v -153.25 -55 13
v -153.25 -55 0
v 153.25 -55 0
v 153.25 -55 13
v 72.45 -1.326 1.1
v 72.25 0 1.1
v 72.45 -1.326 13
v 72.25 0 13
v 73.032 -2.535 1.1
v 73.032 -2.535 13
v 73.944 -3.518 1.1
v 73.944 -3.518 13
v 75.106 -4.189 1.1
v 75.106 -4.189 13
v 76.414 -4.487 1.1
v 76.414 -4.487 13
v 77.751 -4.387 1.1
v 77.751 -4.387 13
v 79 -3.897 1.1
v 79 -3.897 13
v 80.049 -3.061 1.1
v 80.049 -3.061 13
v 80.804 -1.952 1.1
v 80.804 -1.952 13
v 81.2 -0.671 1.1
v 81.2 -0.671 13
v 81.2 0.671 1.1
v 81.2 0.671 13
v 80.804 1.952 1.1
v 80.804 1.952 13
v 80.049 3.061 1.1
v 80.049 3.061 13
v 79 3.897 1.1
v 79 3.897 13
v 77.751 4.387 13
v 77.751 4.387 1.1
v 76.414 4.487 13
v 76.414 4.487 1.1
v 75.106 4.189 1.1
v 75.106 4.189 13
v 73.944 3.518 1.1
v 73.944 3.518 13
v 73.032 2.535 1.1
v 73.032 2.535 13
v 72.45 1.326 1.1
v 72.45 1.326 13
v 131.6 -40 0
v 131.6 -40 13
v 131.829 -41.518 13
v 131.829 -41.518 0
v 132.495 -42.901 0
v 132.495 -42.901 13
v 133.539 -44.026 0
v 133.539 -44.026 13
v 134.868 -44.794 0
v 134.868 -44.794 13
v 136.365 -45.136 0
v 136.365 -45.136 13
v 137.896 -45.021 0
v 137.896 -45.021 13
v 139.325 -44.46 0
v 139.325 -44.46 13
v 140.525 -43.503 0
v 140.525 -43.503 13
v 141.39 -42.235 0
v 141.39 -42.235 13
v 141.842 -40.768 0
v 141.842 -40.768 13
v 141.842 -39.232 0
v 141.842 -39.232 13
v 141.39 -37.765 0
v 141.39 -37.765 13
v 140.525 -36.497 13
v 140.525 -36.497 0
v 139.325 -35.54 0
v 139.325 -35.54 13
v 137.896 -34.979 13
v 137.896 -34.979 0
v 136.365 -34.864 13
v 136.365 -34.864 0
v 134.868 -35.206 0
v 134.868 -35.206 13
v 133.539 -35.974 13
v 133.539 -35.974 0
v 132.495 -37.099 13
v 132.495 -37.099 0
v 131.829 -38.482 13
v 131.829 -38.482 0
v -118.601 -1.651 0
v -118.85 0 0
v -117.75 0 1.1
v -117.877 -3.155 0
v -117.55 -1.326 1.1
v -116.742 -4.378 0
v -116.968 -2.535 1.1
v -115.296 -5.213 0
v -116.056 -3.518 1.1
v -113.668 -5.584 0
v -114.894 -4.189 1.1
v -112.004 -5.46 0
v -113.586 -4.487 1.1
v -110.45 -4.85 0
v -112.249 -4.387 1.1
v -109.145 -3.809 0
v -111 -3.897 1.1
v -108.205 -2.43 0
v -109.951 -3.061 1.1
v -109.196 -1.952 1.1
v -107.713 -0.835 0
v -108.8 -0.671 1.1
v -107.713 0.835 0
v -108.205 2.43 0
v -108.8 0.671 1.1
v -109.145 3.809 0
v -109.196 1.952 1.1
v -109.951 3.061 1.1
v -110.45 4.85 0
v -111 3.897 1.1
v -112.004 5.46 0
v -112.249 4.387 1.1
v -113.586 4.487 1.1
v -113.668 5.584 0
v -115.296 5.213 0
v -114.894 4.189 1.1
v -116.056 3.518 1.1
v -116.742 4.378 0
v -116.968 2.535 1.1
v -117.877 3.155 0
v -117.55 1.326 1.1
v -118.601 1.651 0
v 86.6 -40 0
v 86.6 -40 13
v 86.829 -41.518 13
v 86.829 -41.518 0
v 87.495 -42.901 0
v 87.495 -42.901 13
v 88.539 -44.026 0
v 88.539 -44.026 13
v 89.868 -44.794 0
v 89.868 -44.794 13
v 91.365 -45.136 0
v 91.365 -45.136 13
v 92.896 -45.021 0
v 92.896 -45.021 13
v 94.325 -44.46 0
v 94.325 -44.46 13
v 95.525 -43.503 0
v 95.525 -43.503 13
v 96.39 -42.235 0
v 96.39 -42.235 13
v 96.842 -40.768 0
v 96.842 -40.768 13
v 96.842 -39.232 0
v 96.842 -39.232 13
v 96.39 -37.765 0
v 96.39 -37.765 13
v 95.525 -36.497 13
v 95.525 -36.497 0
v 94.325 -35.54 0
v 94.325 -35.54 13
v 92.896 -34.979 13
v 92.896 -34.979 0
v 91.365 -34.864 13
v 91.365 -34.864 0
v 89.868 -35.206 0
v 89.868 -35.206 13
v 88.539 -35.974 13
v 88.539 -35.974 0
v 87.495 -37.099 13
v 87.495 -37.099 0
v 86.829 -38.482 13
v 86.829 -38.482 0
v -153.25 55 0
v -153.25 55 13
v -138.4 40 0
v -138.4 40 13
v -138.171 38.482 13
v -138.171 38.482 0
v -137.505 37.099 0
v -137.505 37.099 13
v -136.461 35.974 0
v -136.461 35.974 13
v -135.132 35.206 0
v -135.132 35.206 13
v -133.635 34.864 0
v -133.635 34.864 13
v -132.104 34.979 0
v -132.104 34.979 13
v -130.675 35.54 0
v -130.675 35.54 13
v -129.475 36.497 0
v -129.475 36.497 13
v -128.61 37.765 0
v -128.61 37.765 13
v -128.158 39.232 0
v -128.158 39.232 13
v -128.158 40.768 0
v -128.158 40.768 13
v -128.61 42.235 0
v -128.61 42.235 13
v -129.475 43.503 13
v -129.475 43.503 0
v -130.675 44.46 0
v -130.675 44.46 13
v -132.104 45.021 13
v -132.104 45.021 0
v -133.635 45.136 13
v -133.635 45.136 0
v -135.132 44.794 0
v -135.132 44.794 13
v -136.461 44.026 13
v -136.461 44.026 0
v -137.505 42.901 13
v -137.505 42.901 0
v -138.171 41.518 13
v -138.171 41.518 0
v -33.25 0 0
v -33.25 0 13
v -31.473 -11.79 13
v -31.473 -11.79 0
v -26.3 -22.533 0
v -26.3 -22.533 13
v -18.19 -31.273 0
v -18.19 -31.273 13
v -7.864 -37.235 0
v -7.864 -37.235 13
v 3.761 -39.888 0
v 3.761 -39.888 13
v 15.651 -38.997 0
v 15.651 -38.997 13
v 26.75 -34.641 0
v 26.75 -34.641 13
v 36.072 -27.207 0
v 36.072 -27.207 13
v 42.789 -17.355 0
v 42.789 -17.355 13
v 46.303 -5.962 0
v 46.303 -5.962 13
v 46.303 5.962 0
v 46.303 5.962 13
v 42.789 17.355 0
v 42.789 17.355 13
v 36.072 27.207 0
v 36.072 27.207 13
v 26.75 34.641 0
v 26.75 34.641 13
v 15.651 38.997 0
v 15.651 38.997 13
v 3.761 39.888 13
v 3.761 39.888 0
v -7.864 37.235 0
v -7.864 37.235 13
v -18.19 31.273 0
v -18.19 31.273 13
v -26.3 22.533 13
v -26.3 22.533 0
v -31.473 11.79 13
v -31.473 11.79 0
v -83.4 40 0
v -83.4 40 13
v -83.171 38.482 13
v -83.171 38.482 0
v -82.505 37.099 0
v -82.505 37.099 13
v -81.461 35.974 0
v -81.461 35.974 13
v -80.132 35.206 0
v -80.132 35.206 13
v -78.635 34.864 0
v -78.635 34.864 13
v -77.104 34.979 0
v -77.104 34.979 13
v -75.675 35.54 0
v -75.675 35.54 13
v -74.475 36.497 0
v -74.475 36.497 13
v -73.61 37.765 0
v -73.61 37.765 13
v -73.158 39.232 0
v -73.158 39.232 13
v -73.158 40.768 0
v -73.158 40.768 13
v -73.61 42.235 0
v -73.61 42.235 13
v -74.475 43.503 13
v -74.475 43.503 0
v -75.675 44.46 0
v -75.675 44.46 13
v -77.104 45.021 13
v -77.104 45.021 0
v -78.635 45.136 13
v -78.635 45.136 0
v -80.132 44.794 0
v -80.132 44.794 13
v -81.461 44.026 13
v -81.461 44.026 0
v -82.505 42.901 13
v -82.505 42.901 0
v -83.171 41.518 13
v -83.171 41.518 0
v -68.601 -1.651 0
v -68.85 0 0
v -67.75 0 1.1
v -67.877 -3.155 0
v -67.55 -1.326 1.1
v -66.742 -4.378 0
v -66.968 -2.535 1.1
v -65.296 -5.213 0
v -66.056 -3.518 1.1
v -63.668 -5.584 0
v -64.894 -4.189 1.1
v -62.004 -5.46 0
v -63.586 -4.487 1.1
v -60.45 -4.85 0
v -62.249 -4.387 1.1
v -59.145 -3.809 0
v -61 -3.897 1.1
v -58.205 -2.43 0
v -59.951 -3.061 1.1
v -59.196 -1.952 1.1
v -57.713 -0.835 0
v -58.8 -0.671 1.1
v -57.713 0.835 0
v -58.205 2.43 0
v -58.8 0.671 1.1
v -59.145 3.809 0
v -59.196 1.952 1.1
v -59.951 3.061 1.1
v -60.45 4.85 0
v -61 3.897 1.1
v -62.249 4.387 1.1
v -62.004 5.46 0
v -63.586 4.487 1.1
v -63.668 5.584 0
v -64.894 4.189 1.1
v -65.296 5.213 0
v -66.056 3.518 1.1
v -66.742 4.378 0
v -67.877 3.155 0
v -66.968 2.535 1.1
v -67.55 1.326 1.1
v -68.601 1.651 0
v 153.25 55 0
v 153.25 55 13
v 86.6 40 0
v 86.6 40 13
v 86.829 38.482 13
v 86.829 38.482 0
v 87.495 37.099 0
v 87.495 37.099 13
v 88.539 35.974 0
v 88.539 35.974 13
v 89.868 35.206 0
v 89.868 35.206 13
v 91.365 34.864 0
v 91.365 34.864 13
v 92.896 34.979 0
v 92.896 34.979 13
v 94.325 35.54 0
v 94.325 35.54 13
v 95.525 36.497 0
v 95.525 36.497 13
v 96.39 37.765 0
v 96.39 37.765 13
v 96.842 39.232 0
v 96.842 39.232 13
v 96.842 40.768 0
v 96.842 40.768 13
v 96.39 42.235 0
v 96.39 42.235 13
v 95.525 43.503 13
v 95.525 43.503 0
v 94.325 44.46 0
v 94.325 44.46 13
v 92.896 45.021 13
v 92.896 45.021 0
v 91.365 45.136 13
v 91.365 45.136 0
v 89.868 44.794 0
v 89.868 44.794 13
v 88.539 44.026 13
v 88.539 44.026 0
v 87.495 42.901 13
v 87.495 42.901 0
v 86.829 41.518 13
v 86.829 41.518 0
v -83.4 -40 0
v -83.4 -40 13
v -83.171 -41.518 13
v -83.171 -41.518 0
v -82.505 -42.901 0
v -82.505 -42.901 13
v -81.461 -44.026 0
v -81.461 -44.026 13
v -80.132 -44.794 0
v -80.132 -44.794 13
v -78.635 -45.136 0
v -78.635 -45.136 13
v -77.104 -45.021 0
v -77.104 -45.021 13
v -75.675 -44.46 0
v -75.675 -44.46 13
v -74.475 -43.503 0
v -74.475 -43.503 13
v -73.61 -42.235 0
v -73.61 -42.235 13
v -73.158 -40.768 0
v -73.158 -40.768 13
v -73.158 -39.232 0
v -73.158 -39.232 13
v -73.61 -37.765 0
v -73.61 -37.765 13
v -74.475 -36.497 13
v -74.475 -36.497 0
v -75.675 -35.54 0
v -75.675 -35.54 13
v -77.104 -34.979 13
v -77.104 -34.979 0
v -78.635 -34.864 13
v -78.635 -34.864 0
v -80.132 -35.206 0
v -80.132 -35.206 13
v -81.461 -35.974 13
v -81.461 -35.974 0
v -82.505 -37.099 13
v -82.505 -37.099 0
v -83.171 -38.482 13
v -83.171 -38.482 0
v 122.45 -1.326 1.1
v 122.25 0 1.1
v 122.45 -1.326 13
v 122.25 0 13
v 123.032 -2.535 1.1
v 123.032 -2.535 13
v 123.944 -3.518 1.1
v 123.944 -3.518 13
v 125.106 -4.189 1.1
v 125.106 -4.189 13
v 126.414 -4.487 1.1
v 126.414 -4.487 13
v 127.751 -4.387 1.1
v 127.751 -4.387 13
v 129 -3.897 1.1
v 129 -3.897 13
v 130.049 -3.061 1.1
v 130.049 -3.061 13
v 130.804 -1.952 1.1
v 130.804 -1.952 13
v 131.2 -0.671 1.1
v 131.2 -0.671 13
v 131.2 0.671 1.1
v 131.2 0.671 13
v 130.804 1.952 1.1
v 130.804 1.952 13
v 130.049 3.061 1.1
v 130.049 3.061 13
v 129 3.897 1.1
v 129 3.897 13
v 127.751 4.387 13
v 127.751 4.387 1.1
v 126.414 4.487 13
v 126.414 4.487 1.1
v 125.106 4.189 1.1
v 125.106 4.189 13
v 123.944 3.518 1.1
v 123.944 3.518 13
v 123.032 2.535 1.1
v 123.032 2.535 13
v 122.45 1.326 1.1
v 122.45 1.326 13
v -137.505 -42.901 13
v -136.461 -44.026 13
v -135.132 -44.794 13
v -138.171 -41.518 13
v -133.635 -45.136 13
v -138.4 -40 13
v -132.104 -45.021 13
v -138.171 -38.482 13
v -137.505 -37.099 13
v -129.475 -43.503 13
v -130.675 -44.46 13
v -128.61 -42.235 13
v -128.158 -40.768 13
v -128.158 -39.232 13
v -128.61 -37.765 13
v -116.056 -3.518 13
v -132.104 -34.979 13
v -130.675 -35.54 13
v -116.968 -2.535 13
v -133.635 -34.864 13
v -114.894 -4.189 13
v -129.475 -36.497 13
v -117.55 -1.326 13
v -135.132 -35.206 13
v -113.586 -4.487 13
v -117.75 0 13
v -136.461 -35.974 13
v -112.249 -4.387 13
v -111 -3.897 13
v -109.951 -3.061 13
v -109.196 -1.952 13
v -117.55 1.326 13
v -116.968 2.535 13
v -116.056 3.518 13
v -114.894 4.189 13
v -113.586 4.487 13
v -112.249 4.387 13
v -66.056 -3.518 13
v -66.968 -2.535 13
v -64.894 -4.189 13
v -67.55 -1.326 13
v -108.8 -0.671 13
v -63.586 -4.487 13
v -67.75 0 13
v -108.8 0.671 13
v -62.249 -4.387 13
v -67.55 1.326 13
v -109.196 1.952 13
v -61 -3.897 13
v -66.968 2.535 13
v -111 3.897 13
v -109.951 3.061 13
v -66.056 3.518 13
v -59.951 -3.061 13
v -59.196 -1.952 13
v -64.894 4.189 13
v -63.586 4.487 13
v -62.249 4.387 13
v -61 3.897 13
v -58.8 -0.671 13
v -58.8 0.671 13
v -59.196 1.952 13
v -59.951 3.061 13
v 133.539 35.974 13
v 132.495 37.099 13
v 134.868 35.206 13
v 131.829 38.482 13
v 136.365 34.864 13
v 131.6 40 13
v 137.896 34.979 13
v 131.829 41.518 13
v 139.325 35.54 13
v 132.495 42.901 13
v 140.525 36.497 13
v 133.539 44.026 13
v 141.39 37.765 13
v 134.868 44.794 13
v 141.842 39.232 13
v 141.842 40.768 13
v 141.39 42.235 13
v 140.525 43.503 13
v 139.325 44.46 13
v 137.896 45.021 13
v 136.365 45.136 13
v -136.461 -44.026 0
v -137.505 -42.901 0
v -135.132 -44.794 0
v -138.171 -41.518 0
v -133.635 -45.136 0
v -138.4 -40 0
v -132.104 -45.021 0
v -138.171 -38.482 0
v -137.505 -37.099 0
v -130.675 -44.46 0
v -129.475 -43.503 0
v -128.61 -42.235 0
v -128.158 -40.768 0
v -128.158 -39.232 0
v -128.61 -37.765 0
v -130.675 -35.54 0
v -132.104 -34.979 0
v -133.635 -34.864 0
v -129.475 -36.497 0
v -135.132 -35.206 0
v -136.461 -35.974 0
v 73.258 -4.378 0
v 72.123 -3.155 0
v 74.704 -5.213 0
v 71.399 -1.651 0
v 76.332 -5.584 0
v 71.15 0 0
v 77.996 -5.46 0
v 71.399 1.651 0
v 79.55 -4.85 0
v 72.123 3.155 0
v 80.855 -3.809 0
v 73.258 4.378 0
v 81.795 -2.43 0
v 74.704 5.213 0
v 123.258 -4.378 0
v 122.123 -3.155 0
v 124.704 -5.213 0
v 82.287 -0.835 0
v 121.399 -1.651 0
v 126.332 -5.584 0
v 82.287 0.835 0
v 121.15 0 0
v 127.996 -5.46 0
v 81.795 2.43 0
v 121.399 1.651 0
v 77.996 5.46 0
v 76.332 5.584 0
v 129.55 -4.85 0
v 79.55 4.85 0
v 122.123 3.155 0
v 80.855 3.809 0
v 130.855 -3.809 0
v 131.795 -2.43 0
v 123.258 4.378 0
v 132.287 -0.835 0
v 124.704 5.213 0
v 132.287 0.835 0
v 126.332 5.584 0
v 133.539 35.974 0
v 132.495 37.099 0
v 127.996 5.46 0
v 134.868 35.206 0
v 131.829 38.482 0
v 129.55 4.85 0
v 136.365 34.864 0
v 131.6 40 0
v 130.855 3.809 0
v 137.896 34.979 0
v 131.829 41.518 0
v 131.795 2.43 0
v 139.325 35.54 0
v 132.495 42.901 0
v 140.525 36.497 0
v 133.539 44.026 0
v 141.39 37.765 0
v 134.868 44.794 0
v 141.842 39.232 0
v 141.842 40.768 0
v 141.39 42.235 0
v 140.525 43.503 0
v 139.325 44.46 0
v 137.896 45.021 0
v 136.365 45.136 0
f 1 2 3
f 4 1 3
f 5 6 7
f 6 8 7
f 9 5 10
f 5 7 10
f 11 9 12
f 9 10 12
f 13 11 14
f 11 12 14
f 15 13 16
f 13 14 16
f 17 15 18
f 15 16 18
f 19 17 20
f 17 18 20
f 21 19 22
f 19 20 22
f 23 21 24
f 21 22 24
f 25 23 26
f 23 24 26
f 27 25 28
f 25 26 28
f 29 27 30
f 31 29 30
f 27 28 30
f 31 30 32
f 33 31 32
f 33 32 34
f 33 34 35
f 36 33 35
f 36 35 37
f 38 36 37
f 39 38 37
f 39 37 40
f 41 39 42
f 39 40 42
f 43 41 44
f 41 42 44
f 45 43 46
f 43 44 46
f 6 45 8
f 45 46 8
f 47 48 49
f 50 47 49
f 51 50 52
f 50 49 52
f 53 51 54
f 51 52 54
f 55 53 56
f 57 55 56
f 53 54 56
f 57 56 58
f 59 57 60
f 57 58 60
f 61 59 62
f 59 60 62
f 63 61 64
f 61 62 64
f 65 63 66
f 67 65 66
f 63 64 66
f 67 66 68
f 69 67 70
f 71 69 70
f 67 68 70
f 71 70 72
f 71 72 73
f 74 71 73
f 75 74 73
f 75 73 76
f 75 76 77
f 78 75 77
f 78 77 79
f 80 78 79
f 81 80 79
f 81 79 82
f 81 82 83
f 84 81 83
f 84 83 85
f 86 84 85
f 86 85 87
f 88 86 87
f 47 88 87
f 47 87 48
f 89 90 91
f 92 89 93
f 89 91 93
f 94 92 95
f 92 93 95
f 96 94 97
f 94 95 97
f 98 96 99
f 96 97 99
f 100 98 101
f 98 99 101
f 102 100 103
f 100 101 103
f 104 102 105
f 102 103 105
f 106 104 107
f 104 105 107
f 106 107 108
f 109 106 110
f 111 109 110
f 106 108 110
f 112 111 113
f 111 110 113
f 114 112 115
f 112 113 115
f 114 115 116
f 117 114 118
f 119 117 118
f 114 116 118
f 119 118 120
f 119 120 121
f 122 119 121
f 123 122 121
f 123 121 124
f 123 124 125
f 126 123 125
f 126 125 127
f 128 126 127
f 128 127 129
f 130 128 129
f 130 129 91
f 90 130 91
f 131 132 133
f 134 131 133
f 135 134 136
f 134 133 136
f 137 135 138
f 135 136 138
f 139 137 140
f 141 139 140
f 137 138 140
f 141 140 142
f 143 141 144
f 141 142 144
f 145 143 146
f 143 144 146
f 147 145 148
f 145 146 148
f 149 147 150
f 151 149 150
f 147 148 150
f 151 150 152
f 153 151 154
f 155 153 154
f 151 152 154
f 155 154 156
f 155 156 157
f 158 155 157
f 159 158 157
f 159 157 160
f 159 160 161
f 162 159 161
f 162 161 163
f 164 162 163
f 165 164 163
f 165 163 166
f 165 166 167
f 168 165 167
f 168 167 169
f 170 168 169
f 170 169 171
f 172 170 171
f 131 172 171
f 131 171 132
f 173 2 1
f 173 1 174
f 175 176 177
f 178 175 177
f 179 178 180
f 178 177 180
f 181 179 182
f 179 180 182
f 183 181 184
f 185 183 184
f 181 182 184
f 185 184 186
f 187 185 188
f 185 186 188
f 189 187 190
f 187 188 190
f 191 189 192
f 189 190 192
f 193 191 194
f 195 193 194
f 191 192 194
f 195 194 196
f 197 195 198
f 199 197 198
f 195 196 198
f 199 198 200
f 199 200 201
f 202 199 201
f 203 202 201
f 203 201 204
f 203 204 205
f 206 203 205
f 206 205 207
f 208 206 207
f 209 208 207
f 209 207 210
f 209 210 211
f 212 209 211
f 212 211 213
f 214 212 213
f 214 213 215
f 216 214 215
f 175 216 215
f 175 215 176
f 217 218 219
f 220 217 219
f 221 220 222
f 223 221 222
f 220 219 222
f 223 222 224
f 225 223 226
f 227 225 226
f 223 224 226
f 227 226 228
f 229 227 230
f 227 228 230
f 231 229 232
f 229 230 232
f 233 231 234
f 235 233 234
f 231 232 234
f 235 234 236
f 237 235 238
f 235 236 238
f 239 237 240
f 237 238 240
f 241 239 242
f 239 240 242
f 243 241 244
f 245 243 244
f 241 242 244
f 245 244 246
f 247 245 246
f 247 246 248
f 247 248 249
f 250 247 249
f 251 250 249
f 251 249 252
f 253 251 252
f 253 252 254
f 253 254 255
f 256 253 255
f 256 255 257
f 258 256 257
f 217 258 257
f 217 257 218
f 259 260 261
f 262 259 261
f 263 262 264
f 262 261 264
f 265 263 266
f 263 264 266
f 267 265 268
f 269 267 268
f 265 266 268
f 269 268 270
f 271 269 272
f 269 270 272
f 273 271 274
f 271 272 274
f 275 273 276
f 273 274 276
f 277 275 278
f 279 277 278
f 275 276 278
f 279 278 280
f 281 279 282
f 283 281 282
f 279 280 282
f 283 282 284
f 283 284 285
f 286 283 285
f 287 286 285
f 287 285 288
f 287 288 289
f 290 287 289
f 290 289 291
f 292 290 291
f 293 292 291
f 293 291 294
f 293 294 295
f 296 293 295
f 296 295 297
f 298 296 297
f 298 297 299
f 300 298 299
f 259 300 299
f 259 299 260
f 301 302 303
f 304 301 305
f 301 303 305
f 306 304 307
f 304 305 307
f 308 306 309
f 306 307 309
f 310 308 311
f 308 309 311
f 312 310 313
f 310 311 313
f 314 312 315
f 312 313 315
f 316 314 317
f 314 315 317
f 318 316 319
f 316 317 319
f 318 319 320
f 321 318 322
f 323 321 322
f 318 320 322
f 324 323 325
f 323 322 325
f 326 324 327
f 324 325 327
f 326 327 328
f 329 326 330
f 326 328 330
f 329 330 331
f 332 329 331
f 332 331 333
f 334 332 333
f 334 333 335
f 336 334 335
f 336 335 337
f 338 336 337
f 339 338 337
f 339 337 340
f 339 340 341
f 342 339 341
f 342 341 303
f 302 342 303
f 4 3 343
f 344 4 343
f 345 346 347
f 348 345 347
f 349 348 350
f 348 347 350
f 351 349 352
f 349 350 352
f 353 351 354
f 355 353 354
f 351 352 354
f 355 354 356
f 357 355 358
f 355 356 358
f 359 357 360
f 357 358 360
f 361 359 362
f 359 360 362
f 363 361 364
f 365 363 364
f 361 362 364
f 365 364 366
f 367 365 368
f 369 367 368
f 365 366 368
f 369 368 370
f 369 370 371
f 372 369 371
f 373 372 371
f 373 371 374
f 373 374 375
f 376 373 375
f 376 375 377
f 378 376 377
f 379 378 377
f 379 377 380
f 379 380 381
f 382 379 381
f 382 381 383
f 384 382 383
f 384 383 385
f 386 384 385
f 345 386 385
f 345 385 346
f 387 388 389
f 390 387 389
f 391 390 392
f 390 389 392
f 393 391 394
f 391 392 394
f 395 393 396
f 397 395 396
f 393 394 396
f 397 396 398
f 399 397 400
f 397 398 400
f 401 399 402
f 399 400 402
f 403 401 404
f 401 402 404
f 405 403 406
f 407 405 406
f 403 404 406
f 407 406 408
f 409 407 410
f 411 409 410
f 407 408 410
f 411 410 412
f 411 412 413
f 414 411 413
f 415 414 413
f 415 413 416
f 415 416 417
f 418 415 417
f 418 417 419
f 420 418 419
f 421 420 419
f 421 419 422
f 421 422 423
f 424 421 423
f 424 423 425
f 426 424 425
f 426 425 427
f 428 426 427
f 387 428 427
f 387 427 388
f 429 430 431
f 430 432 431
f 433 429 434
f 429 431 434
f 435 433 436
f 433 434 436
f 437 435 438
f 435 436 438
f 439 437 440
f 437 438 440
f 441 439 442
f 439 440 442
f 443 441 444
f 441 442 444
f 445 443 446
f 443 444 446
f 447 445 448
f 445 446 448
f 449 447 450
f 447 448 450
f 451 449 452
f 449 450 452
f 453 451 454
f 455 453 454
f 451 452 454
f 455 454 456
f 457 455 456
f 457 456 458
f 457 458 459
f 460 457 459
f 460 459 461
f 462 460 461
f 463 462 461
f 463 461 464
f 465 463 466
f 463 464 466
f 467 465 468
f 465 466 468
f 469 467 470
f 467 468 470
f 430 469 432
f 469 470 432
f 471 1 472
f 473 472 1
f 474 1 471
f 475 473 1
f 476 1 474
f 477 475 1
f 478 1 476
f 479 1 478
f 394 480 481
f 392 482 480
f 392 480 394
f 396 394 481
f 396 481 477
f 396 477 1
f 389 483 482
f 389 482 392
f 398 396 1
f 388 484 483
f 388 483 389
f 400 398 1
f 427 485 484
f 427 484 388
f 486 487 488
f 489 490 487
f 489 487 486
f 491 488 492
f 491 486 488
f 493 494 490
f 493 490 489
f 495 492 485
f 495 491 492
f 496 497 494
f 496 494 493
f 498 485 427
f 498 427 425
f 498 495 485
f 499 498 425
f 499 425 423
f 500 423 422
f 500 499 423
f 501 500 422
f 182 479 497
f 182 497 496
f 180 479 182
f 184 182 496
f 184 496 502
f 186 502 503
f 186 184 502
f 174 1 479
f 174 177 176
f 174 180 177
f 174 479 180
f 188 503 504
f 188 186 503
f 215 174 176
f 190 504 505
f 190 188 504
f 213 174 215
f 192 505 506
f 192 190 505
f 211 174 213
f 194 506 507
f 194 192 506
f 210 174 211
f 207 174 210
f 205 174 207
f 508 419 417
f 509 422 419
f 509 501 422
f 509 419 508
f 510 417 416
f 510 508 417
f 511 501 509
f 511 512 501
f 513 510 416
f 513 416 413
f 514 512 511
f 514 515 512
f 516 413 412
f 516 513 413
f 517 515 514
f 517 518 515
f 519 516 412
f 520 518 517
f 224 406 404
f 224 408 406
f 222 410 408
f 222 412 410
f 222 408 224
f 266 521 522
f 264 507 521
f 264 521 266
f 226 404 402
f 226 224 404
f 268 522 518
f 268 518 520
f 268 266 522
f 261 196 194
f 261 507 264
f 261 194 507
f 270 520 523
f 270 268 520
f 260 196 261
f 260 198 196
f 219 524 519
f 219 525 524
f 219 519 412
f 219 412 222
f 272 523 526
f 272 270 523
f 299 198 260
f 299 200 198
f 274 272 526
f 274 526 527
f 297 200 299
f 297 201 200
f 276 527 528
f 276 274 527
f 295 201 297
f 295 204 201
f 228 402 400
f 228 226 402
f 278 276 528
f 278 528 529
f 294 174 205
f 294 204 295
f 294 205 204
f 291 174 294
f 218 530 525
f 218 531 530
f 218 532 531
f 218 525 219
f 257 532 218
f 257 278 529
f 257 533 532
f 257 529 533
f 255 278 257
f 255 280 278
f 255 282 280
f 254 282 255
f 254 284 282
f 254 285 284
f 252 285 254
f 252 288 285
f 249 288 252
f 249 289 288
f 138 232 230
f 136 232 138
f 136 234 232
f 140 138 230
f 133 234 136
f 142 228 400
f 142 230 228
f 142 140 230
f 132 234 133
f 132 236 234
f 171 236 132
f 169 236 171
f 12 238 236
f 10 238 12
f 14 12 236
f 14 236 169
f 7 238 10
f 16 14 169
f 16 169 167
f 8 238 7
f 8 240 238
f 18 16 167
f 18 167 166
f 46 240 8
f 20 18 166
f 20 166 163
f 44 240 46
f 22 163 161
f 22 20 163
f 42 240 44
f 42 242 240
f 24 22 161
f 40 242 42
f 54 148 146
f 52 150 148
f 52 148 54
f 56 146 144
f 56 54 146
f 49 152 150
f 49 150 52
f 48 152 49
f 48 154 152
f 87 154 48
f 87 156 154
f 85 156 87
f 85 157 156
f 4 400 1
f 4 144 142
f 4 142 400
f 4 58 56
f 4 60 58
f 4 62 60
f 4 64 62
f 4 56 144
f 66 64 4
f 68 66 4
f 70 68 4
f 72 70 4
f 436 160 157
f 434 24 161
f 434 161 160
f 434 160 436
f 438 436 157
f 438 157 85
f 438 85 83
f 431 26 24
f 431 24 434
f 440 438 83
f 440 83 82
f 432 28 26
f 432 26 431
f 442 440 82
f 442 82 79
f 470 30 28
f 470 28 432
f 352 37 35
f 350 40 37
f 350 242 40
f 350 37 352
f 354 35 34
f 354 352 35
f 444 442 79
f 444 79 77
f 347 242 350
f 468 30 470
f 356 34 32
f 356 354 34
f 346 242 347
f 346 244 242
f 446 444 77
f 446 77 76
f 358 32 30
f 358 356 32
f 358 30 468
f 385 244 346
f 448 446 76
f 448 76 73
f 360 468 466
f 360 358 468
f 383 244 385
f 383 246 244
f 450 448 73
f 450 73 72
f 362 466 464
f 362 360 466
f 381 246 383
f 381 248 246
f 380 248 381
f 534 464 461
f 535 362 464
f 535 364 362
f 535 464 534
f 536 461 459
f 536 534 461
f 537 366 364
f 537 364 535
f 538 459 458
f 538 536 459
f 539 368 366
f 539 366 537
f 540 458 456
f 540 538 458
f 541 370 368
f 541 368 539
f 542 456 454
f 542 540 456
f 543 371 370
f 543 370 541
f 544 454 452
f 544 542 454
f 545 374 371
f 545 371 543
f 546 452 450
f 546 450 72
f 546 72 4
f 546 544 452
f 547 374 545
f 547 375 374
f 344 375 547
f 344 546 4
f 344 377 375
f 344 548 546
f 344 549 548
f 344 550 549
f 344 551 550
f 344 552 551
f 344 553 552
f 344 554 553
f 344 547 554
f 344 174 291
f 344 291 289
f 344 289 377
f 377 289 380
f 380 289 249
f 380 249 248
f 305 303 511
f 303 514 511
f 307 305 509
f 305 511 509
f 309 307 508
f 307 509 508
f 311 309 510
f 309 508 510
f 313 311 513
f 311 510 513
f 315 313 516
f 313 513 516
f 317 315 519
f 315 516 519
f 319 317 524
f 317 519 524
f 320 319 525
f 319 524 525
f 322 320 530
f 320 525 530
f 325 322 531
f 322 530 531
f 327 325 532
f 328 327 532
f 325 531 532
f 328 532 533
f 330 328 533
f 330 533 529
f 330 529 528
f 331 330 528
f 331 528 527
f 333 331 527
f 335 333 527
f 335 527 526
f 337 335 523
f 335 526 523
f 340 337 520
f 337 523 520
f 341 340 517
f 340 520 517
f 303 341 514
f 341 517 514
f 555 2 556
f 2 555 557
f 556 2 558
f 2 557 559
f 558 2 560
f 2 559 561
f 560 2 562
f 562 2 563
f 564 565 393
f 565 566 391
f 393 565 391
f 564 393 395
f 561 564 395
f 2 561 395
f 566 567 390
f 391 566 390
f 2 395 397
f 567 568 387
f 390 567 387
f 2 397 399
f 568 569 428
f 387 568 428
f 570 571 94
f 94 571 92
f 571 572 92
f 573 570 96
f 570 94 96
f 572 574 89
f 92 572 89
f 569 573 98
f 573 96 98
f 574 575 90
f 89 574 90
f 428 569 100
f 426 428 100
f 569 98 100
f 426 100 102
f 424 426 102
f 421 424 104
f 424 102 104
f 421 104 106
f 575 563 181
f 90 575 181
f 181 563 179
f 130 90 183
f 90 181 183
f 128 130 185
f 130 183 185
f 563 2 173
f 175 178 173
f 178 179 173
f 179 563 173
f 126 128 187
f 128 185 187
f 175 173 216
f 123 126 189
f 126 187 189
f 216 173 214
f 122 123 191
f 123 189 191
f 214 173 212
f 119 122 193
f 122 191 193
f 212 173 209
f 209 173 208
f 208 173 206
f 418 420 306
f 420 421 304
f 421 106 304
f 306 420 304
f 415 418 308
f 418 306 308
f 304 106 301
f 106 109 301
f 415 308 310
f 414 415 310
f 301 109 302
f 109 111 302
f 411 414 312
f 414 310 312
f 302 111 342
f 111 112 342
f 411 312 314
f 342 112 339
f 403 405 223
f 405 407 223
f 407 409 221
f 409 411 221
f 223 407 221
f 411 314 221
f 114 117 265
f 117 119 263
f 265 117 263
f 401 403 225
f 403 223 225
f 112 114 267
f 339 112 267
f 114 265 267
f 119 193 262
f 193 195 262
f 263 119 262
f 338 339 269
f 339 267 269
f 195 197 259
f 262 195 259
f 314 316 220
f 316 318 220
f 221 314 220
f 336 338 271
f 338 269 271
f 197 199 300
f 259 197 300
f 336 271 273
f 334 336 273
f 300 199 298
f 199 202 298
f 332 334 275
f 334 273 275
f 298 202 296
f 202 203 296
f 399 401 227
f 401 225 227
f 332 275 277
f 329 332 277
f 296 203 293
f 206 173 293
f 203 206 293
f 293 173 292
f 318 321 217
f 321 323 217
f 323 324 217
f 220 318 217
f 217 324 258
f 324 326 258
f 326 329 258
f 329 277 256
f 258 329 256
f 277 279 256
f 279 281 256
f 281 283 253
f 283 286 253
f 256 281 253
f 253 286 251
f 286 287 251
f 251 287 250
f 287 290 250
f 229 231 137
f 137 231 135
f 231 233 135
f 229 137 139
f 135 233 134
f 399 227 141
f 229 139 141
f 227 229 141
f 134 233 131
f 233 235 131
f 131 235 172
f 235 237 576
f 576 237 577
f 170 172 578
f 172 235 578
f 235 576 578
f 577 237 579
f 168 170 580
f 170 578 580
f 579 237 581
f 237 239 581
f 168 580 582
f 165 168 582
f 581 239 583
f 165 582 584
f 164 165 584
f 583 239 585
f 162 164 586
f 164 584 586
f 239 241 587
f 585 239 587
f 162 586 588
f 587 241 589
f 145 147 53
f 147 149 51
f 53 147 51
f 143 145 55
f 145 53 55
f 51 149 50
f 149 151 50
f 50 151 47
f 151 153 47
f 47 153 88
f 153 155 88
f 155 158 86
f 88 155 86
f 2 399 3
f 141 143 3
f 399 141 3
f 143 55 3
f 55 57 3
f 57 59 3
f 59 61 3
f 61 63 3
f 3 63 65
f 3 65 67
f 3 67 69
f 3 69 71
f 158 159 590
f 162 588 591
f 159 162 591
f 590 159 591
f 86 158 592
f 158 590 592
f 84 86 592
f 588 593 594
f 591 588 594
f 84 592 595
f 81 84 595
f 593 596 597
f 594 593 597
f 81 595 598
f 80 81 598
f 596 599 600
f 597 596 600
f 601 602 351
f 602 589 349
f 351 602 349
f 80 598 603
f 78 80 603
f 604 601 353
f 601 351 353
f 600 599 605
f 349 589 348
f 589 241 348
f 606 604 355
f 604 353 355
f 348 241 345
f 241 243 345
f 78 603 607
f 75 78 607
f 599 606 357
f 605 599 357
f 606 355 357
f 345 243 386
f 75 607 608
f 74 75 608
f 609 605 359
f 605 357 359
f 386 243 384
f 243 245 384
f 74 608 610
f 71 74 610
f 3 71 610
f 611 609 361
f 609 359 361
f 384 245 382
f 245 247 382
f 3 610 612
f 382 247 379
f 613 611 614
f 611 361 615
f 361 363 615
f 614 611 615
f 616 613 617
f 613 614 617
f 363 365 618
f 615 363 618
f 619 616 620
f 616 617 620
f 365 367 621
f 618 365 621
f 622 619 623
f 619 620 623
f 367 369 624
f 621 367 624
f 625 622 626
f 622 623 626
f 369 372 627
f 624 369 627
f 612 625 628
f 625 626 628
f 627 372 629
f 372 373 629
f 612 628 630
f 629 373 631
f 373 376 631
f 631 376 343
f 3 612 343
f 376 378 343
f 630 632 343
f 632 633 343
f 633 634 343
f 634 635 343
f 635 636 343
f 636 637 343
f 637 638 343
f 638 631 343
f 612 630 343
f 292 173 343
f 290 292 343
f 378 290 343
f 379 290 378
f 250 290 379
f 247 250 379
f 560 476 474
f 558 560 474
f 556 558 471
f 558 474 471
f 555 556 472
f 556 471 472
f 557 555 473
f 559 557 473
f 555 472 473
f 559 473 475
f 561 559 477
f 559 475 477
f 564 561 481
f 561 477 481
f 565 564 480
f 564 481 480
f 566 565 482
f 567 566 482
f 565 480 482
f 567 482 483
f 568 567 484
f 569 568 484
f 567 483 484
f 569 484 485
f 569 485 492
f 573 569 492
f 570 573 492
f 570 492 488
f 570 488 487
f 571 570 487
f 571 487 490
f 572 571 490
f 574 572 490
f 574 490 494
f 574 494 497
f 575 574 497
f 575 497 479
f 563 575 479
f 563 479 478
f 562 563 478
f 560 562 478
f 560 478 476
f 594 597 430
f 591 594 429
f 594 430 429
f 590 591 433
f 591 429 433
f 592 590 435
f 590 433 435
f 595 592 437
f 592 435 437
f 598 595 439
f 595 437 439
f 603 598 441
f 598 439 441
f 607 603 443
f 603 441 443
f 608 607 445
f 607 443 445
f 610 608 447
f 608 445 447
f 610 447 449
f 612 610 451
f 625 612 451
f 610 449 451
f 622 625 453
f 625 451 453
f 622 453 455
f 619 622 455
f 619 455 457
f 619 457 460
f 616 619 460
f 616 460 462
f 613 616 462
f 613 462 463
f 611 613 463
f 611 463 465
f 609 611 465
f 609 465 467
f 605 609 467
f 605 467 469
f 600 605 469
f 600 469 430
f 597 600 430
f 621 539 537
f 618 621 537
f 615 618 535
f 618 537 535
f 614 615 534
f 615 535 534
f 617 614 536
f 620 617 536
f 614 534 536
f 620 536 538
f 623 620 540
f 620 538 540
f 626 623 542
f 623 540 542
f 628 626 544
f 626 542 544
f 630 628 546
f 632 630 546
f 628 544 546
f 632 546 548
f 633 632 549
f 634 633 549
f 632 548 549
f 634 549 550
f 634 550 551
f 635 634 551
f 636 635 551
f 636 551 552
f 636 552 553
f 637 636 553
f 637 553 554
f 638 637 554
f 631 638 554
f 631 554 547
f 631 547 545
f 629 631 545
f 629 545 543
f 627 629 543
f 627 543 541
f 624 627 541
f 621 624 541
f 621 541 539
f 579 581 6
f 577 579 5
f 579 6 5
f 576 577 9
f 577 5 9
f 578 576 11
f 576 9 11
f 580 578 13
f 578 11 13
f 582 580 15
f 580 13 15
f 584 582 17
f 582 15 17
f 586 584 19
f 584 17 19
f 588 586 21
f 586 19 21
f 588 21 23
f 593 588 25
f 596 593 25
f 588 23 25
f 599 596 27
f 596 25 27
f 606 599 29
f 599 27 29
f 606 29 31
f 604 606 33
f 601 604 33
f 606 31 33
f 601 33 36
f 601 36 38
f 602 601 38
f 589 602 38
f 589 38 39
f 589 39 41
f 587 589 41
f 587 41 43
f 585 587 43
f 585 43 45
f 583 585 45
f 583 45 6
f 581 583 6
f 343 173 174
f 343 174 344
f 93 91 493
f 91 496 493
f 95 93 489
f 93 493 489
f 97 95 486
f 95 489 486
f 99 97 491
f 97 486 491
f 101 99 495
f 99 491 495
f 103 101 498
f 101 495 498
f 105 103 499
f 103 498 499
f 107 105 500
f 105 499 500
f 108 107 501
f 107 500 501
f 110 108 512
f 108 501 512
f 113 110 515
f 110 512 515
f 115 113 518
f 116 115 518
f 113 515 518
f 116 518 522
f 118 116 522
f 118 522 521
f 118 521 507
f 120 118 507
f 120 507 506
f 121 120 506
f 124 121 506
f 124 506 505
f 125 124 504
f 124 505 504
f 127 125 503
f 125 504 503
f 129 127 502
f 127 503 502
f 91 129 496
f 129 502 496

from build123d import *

# Parameters (mm, degrees)
F0_W           = 306.5
F0_H           = 110
F1_DEPTH       = 13
F2_D           = 9
F2_CSINK_D     = 11.2
F2_CSINK_ANGLE = 90
F3_D           = 80
F4_D           = 10.3


with BuildPart() as f1:
    # F0 (on Top) → F1 (new body)
    with BuildSketch(Plane.XY):
        Rectangle(F0_W, F0_H)
    extrude(amount=F1_DEPTH)

    # F2 (through all)
    with Locations(Plane(origin=(0, 0, 0), x_dir=(1, 0, 0), z_dir=(0, 0, -1))):
        with Locations((-113.25, 0), (-63.25, 0), (76.75, 0), (126.75, 0)):
            CounterSinkHole(F2_D / 2, F2_CSINK_D / 2, counter_sink_angle=F2_CSINK_ANGLE)

    # F3 (through all)
    with Locations(Plane(origin=(0, 0, 0), x_dir=(1, 0, 0), z_dir=(0, 0, -1))):
        with Locations((6.75, 0)):
            Hole(F3_D / 2)

    # F4 (through all)
    with Locations(Plane(origin=(0, 0, 0), x_dir=(1, 0, 0), z_dir=(0, 0, -1))):
        with Locations((-133.25, 40), (-78.25, 40), (-133.25, -40), (-78.25, -40), (91.75, 40), (136.75, 40), (91.75, -40), (136.75, -40)):
            Hole(F4_D / 2)


solid = f1.part
